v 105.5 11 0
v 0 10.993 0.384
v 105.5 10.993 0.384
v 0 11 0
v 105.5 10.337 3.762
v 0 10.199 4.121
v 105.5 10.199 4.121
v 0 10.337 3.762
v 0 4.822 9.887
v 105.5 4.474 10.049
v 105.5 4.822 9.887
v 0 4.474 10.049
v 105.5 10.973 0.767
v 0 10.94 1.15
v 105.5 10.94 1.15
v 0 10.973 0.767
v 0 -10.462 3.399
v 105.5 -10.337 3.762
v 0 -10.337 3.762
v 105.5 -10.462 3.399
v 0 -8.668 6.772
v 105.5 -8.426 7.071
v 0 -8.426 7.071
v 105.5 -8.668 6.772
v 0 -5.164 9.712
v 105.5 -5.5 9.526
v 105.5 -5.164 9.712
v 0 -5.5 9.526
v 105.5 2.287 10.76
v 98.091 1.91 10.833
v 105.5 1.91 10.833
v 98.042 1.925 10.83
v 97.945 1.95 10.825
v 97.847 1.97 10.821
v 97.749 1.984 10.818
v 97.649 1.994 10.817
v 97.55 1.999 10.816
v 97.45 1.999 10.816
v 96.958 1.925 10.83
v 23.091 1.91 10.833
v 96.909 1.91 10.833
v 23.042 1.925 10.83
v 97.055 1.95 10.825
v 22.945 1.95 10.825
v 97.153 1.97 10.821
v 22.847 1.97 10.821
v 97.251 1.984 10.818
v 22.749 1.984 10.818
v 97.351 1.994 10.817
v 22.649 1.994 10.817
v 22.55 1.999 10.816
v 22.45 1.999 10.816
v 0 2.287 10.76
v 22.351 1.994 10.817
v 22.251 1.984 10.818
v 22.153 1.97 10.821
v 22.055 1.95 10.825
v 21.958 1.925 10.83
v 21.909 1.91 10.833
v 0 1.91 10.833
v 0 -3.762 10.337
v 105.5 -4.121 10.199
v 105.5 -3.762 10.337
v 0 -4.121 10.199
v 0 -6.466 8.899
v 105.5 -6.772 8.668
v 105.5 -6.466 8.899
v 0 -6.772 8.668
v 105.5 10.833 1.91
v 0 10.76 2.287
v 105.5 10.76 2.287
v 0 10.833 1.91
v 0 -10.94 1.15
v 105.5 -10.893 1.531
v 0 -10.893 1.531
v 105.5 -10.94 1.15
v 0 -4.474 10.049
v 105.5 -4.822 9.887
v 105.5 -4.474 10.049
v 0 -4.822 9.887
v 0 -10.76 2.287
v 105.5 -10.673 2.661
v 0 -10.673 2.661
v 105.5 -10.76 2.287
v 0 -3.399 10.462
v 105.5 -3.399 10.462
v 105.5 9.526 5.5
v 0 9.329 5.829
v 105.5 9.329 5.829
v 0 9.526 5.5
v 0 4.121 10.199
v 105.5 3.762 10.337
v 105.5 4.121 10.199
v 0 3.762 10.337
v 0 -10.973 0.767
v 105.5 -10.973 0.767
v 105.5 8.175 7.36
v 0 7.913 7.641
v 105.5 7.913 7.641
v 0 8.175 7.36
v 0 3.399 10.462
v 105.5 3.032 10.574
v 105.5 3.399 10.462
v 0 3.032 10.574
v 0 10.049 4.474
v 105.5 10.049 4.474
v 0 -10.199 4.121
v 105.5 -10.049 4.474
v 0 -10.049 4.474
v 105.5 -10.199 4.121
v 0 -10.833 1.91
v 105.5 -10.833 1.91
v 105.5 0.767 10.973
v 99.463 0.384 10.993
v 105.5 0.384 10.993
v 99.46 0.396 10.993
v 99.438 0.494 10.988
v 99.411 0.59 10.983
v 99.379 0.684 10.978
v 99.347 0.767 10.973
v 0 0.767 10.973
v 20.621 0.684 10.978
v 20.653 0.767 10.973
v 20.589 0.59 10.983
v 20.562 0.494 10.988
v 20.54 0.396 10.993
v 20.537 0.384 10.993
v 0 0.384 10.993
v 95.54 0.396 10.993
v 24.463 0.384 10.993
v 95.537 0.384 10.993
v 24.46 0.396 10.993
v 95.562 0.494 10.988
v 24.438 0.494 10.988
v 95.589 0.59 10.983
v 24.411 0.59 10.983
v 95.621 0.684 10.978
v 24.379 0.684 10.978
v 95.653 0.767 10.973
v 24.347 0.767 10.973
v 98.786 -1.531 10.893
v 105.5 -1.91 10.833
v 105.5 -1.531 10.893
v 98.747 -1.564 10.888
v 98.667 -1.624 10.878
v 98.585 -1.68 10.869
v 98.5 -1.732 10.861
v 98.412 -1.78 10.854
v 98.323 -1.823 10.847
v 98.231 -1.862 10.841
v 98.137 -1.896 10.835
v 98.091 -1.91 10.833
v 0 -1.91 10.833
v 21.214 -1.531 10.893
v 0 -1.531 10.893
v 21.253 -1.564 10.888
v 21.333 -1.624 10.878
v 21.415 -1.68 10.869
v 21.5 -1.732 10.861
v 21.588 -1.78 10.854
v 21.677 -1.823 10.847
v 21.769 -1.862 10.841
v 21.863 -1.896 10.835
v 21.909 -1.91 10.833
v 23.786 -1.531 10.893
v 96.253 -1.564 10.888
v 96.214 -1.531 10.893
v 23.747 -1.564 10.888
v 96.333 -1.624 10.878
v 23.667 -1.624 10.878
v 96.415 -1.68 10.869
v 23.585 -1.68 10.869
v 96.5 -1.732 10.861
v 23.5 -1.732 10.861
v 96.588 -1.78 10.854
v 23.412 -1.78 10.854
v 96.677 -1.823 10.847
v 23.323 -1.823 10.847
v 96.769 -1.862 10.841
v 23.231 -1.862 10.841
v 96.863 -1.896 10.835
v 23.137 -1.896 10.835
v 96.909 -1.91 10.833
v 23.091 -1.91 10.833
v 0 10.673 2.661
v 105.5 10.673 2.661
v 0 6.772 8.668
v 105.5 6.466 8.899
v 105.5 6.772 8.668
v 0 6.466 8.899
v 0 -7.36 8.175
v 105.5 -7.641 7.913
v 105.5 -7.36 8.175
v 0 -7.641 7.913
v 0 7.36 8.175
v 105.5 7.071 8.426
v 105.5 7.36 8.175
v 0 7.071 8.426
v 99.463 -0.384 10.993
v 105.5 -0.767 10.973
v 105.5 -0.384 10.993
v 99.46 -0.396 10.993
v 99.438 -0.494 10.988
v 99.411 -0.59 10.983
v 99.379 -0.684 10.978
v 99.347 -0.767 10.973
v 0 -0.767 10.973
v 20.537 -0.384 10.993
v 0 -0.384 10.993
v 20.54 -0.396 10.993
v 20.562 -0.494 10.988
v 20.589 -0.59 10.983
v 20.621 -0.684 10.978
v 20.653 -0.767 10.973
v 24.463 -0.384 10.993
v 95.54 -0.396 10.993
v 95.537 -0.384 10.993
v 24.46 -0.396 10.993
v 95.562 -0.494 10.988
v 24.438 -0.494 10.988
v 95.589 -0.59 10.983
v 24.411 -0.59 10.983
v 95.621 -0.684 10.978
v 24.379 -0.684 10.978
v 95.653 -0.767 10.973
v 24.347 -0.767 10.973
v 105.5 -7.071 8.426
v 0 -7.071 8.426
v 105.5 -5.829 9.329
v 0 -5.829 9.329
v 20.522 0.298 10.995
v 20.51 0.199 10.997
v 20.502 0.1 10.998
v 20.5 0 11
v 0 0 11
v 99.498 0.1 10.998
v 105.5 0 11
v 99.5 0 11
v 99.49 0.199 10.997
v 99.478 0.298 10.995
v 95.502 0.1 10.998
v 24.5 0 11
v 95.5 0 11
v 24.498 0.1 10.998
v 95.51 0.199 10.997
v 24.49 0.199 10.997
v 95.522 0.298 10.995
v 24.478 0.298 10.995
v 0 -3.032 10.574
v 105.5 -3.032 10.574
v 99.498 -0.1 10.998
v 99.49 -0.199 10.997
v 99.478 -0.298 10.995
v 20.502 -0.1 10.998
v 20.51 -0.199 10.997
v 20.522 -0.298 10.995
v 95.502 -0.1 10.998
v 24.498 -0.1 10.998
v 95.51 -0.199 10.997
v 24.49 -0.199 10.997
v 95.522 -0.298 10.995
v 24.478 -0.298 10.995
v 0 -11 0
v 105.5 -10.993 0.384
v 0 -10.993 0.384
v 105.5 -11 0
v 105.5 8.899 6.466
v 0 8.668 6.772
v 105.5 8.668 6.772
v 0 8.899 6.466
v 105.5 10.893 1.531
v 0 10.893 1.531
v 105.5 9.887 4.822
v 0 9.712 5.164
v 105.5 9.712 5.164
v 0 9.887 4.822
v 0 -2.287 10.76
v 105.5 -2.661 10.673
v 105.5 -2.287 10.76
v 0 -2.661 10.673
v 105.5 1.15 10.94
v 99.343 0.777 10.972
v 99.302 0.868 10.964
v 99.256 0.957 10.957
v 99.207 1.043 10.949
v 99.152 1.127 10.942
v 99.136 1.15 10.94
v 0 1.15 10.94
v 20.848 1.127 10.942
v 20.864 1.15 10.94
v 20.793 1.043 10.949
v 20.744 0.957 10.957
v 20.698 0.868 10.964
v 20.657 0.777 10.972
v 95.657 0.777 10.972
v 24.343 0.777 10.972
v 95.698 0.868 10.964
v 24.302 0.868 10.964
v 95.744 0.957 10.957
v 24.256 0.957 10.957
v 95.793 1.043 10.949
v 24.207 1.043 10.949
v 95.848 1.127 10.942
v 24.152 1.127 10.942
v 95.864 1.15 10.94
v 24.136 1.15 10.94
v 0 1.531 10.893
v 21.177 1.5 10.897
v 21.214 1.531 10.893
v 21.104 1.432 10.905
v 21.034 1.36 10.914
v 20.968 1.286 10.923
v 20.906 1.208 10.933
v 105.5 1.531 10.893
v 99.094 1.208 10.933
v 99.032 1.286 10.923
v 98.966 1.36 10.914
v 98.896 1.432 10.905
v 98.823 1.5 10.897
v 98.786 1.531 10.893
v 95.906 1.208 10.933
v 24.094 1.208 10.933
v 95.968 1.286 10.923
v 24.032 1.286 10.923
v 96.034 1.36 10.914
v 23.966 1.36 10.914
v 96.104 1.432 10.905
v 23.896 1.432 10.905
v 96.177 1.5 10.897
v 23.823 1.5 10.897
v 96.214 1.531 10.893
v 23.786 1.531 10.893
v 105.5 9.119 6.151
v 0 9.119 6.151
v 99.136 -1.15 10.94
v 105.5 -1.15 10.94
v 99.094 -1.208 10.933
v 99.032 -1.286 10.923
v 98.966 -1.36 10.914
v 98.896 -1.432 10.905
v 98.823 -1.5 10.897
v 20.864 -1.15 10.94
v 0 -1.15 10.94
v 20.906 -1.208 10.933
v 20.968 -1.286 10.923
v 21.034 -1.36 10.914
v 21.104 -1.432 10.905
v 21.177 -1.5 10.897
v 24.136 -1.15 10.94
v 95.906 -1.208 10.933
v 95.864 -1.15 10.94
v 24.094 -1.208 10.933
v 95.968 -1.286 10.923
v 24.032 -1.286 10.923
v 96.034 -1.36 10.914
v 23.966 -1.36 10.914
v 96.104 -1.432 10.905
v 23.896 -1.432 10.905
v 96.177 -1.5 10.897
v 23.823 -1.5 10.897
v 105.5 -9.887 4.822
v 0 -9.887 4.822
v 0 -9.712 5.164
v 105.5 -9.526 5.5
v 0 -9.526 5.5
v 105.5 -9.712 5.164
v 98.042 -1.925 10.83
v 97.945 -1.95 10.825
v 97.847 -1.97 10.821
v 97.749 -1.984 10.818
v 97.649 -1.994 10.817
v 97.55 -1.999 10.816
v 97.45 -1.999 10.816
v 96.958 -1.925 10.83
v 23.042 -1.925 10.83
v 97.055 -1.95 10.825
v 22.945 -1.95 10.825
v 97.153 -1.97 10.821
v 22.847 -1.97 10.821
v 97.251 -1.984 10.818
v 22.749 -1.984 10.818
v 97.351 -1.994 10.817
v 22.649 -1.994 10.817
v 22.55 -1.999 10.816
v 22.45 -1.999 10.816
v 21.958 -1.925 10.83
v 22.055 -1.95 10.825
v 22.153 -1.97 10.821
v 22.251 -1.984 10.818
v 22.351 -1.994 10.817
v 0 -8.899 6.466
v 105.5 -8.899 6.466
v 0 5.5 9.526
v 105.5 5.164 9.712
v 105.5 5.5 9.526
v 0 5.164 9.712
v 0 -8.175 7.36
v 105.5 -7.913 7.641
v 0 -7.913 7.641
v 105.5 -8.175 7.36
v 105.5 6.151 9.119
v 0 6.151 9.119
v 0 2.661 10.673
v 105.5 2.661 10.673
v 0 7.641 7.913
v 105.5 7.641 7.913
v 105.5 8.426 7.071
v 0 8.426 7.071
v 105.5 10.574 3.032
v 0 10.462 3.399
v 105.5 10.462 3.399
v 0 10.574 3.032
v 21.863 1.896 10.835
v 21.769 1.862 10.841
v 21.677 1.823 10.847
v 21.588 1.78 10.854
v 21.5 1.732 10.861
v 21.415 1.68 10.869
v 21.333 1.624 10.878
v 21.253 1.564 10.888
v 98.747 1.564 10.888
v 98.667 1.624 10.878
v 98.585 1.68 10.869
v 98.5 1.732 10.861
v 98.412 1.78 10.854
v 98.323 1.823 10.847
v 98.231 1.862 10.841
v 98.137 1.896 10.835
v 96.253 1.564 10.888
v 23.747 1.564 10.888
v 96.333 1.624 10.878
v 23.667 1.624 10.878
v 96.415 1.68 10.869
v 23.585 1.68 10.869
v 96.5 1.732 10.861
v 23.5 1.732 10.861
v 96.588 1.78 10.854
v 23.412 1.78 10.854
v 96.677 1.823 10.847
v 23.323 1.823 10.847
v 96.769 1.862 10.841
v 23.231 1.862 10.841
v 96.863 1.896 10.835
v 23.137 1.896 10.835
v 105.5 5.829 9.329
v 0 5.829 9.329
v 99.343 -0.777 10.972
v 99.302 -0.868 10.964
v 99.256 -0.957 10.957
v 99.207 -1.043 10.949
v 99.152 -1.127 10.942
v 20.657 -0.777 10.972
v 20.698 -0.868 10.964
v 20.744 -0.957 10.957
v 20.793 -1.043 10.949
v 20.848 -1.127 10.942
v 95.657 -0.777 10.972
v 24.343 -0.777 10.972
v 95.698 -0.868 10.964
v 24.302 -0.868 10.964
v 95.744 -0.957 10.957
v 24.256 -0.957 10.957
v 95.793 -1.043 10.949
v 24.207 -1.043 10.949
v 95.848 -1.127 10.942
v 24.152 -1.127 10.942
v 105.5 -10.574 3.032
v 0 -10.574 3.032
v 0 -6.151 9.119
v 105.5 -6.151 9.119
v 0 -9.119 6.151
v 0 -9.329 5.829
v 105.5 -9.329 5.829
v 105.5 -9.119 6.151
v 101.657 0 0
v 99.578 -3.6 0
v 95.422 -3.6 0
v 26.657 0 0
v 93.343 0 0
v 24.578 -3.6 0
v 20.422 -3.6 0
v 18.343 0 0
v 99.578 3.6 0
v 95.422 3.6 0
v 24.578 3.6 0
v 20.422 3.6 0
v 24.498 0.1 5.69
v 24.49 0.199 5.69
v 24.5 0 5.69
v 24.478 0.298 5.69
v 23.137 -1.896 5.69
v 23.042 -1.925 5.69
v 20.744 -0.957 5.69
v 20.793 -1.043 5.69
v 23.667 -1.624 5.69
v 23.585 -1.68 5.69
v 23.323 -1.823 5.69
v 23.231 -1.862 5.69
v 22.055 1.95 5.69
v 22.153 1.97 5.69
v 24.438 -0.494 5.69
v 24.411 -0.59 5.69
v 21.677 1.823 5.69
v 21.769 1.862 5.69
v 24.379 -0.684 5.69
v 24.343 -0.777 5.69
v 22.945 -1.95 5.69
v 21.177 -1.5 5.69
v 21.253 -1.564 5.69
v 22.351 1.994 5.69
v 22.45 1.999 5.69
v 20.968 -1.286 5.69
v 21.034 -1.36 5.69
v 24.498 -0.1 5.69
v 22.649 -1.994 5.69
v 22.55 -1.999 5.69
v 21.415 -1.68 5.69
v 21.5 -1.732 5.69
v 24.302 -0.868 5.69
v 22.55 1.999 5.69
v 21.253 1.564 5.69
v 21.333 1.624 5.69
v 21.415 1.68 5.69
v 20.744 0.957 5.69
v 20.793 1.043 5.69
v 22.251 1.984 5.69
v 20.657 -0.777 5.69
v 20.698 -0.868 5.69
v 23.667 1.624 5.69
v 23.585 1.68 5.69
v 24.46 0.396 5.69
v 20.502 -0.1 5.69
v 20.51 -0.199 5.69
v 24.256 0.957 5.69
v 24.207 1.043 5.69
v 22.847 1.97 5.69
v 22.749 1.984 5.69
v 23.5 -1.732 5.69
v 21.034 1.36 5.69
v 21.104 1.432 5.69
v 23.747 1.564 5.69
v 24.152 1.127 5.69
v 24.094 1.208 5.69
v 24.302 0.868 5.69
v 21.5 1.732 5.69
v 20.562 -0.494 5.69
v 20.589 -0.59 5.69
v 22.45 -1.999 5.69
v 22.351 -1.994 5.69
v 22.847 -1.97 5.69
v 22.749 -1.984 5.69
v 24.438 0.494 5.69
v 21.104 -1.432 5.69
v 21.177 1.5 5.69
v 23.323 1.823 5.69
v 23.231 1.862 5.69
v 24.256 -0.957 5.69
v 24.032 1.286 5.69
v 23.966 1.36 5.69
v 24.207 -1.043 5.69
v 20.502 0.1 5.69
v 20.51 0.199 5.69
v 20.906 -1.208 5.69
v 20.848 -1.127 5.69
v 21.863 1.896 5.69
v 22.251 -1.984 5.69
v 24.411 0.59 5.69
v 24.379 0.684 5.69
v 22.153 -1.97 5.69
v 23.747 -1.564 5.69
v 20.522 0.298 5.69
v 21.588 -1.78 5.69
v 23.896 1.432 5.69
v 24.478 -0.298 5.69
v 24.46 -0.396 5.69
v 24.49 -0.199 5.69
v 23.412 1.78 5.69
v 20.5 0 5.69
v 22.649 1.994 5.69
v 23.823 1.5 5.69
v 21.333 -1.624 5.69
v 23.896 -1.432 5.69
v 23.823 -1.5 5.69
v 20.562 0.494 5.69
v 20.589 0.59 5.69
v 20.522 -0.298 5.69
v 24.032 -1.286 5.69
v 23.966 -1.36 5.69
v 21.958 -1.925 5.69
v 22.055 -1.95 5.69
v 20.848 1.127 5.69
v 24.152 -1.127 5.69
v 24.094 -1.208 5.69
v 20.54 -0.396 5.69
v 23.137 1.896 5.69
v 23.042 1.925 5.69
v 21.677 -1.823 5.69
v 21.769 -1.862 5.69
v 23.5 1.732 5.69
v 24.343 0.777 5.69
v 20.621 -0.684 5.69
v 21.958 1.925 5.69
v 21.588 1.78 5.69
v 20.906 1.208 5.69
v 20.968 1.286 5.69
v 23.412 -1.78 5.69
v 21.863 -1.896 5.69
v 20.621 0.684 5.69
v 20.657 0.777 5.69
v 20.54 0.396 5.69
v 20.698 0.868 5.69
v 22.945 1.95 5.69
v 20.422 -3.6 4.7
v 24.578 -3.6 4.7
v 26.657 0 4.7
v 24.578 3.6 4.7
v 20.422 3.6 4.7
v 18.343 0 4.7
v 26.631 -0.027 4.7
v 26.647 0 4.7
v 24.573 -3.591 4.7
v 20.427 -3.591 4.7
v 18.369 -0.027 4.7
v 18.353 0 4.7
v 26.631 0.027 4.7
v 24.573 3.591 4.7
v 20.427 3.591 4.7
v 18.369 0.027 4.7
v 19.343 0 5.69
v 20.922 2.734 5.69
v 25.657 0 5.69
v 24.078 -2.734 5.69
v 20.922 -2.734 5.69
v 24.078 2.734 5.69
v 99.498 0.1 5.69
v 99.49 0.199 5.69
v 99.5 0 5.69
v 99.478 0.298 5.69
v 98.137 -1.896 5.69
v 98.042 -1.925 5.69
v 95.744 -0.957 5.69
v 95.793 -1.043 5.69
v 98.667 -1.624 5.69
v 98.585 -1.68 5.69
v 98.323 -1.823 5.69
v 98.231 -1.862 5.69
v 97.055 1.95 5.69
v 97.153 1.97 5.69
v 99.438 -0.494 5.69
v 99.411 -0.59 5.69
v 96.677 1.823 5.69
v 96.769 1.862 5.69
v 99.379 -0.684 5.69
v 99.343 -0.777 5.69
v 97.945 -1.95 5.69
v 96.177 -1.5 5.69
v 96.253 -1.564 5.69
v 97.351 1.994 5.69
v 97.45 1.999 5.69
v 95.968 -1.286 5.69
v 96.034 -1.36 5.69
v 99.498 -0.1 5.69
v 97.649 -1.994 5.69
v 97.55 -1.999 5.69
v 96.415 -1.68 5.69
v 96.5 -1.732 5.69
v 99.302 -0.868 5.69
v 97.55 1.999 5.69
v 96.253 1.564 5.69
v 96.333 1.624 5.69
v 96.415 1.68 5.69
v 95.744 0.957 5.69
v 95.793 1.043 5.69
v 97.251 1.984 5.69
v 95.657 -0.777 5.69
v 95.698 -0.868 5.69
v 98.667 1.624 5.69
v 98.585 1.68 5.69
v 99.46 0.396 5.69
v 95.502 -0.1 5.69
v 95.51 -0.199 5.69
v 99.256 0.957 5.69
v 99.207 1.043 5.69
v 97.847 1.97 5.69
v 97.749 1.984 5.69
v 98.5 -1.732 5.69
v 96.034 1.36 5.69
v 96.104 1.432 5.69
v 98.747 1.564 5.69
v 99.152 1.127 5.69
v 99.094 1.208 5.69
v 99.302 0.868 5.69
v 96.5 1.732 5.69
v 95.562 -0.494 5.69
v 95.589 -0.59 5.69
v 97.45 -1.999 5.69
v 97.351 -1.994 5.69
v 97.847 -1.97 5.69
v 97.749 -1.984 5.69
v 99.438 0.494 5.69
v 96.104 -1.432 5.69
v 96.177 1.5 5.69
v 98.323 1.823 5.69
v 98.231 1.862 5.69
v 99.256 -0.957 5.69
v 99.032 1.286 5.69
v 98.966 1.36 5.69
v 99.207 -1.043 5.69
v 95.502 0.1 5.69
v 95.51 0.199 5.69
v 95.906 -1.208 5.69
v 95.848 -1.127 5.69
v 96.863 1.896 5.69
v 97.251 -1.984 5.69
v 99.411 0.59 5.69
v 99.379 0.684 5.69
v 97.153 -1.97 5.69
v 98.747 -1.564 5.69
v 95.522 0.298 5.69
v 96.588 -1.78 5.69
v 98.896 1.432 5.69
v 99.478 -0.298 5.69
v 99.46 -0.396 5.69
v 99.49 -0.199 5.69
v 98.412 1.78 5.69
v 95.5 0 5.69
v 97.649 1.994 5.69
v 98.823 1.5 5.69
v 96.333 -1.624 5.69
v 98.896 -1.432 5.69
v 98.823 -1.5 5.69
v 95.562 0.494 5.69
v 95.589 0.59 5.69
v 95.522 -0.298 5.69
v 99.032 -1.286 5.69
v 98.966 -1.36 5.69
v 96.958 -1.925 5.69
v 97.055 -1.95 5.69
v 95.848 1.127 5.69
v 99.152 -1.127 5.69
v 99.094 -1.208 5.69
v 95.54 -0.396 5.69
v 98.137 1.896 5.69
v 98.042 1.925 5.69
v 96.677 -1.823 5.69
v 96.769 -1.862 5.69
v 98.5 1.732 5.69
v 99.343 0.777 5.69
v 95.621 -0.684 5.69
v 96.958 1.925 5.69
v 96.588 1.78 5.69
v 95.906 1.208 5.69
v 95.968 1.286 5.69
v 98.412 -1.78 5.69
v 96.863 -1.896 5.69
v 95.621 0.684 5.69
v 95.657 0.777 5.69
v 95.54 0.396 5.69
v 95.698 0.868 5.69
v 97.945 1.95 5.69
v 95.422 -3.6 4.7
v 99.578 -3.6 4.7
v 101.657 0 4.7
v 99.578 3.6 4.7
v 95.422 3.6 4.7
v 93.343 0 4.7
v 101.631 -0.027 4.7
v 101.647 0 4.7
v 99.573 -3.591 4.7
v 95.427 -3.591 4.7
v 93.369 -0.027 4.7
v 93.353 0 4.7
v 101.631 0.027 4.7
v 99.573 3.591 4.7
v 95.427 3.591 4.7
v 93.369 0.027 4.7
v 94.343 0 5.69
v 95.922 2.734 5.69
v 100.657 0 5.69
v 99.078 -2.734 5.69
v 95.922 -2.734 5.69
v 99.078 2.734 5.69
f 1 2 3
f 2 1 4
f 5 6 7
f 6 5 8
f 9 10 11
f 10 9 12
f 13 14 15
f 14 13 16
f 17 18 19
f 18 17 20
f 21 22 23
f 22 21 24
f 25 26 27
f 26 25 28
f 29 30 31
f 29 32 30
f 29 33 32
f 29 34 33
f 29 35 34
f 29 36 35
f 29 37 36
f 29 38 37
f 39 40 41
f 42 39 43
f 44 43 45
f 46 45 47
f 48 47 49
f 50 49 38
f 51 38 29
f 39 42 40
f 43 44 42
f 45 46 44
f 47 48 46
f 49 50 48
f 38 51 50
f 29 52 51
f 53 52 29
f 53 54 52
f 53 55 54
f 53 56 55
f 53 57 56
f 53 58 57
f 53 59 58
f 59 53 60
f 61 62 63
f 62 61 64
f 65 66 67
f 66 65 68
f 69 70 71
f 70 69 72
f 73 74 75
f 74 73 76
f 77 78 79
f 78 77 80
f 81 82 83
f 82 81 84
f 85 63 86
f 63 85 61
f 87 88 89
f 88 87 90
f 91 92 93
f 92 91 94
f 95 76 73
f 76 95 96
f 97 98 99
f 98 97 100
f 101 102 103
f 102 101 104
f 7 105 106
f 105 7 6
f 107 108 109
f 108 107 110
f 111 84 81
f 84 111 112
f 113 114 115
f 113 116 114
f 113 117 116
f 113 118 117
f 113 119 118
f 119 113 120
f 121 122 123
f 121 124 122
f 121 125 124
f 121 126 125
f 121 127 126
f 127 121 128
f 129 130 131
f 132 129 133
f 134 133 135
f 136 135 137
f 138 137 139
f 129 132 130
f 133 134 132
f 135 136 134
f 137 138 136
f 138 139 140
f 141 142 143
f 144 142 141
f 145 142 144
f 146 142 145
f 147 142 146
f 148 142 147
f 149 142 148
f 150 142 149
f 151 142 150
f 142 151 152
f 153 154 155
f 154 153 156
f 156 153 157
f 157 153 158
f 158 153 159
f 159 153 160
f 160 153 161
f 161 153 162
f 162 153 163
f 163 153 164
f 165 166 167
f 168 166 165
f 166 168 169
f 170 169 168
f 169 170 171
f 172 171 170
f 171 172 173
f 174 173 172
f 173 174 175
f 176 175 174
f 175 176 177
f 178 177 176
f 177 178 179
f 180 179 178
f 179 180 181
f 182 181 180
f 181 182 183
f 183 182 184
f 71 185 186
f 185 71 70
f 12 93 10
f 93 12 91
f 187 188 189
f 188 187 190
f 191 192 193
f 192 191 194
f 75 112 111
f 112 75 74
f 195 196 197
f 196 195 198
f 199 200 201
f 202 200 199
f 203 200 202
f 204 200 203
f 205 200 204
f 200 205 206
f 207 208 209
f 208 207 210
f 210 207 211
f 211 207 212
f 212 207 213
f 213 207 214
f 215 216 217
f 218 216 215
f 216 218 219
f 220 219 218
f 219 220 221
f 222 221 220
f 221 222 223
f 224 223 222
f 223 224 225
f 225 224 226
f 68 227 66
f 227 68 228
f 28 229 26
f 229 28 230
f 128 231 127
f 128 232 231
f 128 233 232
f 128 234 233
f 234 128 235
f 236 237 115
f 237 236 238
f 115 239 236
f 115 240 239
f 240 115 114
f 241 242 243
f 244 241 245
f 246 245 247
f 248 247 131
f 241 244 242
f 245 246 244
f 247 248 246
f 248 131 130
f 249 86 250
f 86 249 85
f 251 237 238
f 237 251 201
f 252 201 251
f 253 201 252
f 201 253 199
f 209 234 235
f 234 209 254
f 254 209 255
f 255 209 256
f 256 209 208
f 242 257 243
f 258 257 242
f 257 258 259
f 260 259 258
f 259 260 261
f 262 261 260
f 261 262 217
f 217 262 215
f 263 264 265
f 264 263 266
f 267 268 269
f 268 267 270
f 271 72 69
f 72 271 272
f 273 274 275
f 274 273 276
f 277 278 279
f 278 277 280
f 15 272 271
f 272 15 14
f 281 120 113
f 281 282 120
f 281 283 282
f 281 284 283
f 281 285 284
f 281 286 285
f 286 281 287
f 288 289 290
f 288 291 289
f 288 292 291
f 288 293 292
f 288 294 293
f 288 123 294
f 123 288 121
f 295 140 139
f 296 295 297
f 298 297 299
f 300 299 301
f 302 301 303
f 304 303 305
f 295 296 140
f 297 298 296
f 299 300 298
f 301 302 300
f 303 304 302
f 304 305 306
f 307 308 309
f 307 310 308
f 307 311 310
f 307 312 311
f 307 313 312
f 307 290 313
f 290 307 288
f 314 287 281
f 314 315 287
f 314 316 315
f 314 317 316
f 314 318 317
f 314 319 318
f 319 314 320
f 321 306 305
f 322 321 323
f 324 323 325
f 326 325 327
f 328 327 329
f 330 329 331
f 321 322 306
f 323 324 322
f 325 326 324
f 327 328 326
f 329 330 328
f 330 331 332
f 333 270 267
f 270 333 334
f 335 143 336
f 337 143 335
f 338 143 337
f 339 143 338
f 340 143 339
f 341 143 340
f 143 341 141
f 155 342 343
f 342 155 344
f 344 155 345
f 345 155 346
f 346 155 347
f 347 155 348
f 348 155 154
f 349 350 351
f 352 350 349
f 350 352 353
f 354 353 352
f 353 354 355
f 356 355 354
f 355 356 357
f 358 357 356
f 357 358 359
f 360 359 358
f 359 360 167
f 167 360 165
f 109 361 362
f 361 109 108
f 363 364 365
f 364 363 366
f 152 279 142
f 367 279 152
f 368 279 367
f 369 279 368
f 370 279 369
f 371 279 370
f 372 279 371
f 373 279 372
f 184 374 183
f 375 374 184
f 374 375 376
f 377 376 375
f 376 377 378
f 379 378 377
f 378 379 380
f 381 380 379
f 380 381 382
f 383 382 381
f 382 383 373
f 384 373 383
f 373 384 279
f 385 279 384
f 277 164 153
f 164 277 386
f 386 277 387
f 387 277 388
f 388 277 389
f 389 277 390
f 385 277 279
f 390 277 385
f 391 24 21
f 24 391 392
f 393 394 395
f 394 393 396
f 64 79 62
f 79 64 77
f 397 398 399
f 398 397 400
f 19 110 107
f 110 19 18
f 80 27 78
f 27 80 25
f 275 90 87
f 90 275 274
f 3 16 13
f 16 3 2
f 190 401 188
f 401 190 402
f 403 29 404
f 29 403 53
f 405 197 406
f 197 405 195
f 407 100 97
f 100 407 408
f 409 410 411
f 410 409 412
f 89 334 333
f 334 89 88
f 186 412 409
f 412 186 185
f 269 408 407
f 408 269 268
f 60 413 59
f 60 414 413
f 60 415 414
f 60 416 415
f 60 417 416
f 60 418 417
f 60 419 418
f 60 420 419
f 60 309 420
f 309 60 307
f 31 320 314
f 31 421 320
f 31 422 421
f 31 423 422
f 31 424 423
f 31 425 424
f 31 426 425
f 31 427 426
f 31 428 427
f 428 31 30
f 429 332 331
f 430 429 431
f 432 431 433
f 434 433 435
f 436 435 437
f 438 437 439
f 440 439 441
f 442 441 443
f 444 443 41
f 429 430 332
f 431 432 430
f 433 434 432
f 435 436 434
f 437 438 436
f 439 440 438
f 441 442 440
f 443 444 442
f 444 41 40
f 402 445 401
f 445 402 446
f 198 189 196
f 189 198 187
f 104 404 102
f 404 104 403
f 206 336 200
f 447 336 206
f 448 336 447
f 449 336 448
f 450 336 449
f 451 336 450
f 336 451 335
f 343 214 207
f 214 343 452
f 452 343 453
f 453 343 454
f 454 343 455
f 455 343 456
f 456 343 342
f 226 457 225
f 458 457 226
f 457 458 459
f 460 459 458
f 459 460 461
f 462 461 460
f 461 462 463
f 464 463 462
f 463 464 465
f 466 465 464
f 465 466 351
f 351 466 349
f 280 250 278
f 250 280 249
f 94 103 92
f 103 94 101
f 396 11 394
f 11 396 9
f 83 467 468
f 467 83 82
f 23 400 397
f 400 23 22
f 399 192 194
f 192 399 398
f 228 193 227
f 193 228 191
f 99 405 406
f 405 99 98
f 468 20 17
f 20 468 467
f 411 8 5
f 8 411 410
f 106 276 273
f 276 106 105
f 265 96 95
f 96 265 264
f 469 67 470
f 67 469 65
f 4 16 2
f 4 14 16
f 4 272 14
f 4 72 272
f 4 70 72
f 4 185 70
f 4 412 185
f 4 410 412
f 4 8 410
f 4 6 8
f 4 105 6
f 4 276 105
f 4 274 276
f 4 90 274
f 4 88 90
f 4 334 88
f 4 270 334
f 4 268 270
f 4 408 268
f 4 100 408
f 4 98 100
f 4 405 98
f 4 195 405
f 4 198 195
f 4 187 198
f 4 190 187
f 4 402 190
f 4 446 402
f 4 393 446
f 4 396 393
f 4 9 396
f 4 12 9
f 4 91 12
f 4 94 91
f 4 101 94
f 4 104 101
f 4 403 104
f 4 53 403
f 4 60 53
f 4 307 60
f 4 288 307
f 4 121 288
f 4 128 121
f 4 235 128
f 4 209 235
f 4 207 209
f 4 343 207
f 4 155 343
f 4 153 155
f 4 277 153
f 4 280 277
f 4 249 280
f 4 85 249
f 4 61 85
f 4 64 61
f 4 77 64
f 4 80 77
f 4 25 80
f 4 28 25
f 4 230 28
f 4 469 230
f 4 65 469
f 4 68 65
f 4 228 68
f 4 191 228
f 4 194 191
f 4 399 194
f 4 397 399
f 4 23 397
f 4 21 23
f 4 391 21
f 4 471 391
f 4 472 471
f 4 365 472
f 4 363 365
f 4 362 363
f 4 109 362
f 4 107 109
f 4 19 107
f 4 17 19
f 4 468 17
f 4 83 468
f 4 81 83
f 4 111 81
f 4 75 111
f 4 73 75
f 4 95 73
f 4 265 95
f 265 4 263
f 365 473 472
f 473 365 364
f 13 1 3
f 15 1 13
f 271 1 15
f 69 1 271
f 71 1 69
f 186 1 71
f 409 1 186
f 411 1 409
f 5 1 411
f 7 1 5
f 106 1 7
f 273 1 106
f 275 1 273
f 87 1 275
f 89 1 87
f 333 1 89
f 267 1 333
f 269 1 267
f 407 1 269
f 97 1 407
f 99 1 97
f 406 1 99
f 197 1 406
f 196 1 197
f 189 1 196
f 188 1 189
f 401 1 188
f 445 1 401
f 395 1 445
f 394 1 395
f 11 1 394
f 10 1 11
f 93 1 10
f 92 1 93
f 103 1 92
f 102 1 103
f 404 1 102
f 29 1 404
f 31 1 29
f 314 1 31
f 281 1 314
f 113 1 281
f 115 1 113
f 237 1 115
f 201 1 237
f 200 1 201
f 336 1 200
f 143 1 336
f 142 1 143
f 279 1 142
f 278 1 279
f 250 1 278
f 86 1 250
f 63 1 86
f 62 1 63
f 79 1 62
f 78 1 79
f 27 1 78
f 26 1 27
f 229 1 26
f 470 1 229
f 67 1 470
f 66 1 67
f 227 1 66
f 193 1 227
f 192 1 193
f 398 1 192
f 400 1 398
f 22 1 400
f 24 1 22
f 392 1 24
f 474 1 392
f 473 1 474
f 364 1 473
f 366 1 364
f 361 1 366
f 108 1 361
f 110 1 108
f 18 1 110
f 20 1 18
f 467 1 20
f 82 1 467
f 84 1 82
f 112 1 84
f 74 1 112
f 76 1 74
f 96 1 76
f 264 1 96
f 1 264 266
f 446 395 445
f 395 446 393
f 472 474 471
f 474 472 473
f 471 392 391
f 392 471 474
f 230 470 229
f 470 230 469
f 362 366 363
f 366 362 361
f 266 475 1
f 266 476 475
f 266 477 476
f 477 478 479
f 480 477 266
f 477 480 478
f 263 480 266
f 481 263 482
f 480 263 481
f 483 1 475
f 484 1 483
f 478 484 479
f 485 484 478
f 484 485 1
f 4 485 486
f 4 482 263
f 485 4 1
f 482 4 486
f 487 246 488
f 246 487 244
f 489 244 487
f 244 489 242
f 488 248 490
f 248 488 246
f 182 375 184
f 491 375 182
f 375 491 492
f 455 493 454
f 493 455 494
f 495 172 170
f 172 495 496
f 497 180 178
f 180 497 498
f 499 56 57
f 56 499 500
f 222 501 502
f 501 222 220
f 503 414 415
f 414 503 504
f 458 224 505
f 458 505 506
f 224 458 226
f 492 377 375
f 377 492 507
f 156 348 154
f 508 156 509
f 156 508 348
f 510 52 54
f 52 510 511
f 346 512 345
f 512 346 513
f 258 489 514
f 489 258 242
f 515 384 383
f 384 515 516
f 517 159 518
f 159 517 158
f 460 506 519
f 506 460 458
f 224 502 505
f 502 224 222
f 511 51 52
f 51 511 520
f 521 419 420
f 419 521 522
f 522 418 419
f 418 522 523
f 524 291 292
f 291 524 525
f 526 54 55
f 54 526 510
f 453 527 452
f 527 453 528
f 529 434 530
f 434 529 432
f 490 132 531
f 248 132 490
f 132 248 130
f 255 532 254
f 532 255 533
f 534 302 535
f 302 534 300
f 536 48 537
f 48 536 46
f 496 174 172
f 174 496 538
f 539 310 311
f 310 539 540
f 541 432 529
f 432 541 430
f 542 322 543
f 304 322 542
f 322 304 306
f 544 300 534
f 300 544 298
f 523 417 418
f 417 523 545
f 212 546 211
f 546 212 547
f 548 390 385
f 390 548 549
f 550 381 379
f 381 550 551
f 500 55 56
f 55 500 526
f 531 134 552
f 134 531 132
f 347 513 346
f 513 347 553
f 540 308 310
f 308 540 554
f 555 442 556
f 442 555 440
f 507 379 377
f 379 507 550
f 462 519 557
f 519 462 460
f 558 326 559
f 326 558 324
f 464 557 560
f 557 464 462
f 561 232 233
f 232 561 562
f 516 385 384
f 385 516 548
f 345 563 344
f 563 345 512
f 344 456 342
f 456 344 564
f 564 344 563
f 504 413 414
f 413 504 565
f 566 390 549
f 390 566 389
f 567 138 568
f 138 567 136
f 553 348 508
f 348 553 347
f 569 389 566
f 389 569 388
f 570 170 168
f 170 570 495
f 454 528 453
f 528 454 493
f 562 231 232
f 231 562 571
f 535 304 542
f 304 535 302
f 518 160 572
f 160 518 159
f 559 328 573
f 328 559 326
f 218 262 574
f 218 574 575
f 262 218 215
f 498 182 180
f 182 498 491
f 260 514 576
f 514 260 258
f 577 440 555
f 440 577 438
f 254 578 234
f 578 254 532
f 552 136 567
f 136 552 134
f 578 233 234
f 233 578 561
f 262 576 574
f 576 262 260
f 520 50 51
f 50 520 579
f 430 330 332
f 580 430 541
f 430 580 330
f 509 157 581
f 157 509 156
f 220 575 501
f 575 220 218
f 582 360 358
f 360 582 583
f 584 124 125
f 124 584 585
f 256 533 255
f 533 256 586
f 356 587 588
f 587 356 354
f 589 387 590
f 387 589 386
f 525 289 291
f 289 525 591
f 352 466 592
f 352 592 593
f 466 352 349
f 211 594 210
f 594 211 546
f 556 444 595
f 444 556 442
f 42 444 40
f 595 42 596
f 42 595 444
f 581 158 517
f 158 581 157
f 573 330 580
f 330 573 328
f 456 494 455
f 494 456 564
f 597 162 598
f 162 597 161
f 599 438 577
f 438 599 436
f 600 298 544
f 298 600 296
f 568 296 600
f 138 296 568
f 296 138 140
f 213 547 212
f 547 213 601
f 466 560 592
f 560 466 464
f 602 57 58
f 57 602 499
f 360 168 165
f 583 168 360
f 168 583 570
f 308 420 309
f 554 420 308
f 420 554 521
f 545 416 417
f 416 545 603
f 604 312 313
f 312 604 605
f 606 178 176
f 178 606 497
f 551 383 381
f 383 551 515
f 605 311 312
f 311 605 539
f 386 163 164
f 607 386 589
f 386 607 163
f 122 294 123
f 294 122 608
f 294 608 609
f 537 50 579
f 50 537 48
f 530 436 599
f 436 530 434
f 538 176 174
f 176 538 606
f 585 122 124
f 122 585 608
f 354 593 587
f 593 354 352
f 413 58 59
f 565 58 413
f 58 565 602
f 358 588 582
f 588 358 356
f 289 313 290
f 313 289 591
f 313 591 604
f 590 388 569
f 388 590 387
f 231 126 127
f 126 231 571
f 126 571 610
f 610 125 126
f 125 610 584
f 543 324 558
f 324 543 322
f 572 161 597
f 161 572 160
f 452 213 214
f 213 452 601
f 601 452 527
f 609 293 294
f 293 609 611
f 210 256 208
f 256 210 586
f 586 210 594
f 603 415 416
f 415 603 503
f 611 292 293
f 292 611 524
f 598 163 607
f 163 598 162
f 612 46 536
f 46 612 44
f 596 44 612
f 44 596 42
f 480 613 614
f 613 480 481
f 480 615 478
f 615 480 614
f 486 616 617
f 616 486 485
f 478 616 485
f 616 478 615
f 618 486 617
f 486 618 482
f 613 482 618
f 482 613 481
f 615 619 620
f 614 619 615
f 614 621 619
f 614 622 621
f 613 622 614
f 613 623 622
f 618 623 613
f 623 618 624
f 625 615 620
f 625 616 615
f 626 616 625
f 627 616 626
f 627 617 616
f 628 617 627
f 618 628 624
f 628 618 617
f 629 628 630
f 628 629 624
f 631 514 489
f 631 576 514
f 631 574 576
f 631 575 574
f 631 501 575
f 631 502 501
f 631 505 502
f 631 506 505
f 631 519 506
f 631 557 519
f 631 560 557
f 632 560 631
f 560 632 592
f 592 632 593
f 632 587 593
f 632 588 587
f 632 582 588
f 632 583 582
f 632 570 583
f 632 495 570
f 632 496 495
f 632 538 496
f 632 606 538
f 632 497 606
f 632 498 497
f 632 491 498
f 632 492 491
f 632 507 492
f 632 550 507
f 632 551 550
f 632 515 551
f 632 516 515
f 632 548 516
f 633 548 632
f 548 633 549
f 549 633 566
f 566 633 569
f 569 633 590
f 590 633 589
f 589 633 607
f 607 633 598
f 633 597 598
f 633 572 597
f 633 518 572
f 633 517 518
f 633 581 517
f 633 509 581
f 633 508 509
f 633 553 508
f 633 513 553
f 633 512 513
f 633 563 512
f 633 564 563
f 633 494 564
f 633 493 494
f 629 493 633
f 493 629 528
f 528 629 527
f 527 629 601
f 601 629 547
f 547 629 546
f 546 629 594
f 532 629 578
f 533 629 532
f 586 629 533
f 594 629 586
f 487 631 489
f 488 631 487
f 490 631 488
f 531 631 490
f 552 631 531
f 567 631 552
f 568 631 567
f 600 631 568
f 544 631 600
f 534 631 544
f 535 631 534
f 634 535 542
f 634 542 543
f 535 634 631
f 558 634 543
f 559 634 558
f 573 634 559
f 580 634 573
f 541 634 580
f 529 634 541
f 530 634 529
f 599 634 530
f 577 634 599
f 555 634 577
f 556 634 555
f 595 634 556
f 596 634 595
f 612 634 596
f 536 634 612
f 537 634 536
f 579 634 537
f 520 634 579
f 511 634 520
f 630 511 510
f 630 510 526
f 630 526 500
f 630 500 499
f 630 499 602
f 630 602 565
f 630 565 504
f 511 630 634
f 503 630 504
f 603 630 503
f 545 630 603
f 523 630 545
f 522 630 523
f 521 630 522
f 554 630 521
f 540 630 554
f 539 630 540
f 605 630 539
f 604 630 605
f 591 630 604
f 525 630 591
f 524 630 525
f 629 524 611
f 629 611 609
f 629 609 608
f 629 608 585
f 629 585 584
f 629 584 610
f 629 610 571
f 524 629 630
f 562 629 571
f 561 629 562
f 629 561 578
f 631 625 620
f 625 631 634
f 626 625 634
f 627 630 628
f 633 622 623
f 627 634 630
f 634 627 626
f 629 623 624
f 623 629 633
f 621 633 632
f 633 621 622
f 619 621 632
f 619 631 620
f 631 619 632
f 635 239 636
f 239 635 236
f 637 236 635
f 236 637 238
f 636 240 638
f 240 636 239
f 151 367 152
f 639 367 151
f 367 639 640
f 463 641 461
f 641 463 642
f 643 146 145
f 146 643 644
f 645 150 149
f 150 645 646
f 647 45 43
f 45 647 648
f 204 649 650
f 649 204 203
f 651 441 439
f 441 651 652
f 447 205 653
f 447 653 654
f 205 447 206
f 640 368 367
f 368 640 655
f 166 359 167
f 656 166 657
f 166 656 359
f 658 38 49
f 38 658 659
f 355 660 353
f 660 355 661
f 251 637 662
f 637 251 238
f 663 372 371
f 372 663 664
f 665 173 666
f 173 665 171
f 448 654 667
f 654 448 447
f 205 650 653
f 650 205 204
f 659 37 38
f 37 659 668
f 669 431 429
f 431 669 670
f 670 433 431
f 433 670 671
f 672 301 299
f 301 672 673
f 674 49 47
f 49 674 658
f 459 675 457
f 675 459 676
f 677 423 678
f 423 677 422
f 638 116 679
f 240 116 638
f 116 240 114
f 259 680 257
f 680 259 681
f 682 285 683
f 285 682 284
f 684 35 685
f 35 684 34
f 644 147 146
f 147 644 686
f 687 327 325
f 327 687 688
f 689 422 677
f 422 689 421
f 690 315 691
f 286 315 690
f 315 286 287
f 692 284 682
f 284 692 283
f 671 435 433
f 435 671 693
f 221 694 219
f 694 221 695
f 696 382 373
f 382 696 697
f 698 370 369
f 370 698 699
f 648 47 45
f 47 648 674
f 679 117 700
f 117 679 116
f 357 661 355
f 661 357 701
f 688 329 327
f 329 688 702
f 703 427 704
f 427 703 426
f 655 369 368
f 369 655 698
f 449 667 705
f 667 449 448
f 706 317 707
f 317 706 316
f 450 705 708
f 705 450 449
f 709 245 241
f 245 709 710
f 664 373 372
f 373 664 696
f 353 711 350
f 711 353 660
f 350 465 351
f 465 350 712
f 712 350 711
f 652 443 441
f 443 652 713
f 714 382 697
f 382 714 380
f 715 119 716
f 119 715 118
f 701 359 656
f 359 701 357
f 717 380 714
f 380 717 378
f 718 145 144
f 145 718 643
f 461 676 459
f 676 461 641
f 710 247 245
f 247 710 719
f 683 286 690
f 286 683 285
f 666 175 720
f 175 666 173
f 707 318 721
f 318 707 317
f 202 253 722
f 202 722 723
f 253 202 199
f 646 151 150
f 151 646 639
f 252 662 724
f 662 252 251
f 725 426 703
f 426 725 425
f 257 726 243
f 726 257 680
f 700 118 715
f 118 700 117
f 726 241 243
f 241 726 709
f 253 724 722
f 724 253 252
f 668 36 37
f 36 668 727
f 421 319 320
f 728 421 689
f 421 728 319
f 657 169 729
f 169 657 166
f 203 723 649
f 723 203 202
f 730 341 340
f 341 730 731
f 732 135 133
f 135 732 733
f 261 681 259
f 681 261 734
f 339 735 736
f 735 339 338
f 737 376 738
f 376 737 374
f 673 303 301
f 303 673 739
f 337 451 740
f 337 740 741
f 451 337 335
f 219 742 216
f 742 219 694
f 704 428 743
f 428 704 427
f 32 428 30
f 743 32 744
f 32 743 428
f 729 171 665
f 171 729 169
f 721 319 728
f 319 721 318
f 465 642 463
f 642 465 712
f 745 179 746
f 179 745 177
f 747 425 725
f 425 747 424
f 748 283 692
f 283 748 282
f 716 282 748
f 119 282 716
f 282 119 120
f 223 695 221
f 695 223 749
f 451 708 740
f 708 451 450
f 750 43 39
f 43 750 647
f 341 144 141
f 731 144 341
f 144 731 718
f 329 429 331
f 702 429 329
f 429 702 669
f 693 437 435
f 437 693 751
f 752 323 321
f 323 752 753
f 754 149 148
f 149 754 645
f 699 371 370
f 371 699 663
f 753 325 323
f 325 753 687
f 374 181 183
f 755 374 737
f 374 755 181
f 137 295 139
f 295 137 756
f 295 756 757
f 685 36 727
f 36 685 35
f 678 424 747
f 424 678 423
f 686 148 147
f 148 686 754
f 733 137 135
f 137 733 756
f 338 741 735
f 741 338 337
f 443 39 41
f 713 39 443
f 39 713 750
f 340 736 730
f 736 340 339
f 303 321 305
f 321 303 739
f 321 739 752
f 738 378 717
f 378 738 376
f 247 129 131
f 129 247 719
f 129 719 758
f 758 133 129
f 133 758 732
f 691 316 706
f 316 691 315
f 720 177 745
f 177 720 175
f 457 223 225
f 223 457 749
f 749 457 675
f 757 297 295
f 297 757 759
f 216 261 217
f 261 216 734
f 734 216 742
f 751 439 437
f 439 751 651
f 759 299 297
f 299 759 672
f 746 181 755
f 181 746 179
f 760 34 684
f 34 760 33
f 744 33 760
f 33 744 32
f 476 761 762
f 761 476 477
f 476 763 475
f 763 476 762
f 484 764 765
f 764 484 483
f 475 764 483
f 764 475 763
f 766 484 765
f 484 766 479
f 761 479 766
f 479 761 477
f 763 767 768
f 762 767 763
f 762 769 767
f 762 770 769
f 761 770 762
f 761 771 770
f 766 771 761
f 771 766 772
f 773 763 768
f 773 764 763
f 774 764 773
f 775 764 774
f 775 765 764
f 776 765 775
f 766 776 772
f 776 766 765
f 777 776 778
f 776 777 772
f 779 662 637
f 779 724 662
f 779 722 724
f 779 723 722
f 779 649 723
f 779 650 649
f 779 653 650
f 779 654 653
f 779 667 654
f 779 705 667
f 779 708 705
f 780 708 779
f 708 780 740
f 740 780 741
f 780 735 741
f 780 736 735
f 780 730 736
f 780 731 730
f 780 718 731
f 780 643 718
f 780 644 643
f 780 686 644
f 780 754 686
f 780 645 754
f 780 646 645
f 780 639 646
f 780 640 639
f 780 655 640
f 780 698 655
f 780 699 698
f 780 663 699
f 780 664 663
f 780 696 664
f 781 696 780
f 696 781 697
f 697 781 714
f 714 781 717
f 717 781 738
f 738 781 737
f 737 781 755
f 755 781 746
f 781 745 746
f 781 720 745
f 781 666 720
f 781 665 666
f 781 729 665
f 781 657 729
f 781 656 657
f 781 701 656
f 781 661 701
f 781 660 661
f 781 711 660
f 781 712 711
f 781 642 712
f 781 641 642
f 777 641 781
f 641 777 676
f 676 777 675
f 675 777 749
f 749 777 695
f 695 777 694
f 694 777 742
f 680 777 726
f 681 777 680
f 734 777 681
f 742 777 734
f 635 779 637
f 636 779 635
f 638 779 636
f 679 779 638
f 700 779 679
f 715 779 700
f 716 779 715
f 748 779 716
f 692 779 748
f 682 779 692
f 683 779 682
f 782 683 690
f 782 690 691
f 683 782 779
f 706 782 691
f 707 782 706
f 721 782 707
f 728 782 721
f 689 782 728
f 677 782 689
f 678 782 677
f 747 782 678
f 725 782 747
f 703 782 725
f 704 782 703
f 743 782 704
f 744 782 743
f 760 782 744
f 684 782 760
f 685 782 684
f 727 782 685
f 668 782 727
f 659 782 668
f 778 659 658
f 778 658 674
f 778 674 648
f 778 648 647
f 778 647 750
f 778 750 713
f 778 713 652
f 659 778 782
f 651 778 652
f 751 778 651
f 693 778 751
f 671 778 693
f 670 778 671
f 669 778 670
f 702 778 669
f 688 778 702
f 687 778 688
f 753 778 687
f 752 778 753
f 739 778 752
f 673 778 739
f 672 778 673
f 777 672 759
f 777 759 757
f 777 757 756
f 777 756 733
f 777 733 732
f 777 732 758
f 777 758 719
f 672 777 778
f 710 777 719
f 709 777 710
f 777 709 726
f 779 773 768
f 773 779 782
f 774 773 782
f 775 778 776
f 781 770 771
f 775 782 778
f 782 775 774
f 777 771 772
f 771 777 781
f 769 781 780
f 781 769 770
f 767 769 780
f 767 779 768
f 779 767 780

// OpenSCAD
// MPCNC tool mount nut trap
// https://www.thingiverse.com/thing:3038722
// Robbert Klarenbeek
//
// Remixed from https://www.thingiverse.com/thing:907882 (by GeoDave)
//
// - Uses standard spacings as shown on MPCNC assembly page
// - Built for 25mm conduit (international "F" version)
// - Uses $fn = 0 in order to create smooth arcs when imported
//   into FreeCAD, which in turn generates a smooth STEP export

// Size of the conduit used / MPCNC version
conduit_outer_diameter = 25; // [23.5:Version C (23.5mm), 25:Version F (25mm), 25.4:Version J (25.4mm)]
// How thick the wall of your conduit is
conduit_wall_thickness = 1.5;
// How far from the bottom the 1st hole will be
first_hole_position = 22.5;
// The distance between the 1st and 2nd hole
hole_distance = 75;
// Added space above the 2nd hole
top_clearance = 8;
// Diameter of the holes (for M4, use 4mm)
hole_diameter = 4;
// Distance between 2 parallel sides of the hex shape (for M4, use 7.2mm)
nut_size = 7.2;
// Height of your nut (for M4 nyloc nut, use 4.7mm)
nut_height = 4.7;
// Orientation of the hex shape
nut_orientation = 0; // [0:Parallel to long edge, 30:Parallel to short edge]

// Create anonymous scope to hide from customizer
{
    $fn = 0; // Keep at 0 for smooth FreeCAD import / STEP output
    $fa = 2;
    $fs = 0.1;
    cut_margin = 1;
    second_hole_position = first_hole_position + hole_distance;
    length = second_hole_position + top_clearance;
    diameter = conduit_outer_diameter - 2 * conduit_wall_thickness;
    radius_margin = diameter / 2 + cut_margin;
    nut_diameter = nut_size * 2 / sqrt(3);
    nut_chamfer_height = 1;
    nut_chamfer_diameter = nut_diameter - 2;
}

module ConduitInsert() {
    difference()
    {
        rotate([0, 90, 0])
            cylinder(d = diameter, h = length);
        translate([-cut_margin, -radius_margin, -radius_margin])
            cube([length + cut_margin * 2, radius_margin * 2, radius_margin]);
    }
}

module HoleAndNutTrap() {
    rotate([0, 0, nut_orientation]) translate([0, 0, -cut_margin]) {
        cylinder(d = hole_diameter, h = radius_margin + cut_margin);
        cylinder(d = nut_diameter, h = nut_height + cut_margin, $fn = 6);
        translate([0, 0, nut_height + cut_margin - 0.01])
            cylinder(d1 = nut_diameter, d2 = nut_chamfer_diameter, h = nut_chamfer_height, $fn = 6);
    }
}

module Thing() {
    // Using nested difference() to prevent FreeCAD import from crashing
    difference() {
        difference() {
            ConduitInsert();
            translate([first_hole_position, 0, 0])
                HoleAndNutTrap();
        }
        translate([second_hole_position, 0, 0])
            HoleAndNutTrap();
    }
}

Thing();
